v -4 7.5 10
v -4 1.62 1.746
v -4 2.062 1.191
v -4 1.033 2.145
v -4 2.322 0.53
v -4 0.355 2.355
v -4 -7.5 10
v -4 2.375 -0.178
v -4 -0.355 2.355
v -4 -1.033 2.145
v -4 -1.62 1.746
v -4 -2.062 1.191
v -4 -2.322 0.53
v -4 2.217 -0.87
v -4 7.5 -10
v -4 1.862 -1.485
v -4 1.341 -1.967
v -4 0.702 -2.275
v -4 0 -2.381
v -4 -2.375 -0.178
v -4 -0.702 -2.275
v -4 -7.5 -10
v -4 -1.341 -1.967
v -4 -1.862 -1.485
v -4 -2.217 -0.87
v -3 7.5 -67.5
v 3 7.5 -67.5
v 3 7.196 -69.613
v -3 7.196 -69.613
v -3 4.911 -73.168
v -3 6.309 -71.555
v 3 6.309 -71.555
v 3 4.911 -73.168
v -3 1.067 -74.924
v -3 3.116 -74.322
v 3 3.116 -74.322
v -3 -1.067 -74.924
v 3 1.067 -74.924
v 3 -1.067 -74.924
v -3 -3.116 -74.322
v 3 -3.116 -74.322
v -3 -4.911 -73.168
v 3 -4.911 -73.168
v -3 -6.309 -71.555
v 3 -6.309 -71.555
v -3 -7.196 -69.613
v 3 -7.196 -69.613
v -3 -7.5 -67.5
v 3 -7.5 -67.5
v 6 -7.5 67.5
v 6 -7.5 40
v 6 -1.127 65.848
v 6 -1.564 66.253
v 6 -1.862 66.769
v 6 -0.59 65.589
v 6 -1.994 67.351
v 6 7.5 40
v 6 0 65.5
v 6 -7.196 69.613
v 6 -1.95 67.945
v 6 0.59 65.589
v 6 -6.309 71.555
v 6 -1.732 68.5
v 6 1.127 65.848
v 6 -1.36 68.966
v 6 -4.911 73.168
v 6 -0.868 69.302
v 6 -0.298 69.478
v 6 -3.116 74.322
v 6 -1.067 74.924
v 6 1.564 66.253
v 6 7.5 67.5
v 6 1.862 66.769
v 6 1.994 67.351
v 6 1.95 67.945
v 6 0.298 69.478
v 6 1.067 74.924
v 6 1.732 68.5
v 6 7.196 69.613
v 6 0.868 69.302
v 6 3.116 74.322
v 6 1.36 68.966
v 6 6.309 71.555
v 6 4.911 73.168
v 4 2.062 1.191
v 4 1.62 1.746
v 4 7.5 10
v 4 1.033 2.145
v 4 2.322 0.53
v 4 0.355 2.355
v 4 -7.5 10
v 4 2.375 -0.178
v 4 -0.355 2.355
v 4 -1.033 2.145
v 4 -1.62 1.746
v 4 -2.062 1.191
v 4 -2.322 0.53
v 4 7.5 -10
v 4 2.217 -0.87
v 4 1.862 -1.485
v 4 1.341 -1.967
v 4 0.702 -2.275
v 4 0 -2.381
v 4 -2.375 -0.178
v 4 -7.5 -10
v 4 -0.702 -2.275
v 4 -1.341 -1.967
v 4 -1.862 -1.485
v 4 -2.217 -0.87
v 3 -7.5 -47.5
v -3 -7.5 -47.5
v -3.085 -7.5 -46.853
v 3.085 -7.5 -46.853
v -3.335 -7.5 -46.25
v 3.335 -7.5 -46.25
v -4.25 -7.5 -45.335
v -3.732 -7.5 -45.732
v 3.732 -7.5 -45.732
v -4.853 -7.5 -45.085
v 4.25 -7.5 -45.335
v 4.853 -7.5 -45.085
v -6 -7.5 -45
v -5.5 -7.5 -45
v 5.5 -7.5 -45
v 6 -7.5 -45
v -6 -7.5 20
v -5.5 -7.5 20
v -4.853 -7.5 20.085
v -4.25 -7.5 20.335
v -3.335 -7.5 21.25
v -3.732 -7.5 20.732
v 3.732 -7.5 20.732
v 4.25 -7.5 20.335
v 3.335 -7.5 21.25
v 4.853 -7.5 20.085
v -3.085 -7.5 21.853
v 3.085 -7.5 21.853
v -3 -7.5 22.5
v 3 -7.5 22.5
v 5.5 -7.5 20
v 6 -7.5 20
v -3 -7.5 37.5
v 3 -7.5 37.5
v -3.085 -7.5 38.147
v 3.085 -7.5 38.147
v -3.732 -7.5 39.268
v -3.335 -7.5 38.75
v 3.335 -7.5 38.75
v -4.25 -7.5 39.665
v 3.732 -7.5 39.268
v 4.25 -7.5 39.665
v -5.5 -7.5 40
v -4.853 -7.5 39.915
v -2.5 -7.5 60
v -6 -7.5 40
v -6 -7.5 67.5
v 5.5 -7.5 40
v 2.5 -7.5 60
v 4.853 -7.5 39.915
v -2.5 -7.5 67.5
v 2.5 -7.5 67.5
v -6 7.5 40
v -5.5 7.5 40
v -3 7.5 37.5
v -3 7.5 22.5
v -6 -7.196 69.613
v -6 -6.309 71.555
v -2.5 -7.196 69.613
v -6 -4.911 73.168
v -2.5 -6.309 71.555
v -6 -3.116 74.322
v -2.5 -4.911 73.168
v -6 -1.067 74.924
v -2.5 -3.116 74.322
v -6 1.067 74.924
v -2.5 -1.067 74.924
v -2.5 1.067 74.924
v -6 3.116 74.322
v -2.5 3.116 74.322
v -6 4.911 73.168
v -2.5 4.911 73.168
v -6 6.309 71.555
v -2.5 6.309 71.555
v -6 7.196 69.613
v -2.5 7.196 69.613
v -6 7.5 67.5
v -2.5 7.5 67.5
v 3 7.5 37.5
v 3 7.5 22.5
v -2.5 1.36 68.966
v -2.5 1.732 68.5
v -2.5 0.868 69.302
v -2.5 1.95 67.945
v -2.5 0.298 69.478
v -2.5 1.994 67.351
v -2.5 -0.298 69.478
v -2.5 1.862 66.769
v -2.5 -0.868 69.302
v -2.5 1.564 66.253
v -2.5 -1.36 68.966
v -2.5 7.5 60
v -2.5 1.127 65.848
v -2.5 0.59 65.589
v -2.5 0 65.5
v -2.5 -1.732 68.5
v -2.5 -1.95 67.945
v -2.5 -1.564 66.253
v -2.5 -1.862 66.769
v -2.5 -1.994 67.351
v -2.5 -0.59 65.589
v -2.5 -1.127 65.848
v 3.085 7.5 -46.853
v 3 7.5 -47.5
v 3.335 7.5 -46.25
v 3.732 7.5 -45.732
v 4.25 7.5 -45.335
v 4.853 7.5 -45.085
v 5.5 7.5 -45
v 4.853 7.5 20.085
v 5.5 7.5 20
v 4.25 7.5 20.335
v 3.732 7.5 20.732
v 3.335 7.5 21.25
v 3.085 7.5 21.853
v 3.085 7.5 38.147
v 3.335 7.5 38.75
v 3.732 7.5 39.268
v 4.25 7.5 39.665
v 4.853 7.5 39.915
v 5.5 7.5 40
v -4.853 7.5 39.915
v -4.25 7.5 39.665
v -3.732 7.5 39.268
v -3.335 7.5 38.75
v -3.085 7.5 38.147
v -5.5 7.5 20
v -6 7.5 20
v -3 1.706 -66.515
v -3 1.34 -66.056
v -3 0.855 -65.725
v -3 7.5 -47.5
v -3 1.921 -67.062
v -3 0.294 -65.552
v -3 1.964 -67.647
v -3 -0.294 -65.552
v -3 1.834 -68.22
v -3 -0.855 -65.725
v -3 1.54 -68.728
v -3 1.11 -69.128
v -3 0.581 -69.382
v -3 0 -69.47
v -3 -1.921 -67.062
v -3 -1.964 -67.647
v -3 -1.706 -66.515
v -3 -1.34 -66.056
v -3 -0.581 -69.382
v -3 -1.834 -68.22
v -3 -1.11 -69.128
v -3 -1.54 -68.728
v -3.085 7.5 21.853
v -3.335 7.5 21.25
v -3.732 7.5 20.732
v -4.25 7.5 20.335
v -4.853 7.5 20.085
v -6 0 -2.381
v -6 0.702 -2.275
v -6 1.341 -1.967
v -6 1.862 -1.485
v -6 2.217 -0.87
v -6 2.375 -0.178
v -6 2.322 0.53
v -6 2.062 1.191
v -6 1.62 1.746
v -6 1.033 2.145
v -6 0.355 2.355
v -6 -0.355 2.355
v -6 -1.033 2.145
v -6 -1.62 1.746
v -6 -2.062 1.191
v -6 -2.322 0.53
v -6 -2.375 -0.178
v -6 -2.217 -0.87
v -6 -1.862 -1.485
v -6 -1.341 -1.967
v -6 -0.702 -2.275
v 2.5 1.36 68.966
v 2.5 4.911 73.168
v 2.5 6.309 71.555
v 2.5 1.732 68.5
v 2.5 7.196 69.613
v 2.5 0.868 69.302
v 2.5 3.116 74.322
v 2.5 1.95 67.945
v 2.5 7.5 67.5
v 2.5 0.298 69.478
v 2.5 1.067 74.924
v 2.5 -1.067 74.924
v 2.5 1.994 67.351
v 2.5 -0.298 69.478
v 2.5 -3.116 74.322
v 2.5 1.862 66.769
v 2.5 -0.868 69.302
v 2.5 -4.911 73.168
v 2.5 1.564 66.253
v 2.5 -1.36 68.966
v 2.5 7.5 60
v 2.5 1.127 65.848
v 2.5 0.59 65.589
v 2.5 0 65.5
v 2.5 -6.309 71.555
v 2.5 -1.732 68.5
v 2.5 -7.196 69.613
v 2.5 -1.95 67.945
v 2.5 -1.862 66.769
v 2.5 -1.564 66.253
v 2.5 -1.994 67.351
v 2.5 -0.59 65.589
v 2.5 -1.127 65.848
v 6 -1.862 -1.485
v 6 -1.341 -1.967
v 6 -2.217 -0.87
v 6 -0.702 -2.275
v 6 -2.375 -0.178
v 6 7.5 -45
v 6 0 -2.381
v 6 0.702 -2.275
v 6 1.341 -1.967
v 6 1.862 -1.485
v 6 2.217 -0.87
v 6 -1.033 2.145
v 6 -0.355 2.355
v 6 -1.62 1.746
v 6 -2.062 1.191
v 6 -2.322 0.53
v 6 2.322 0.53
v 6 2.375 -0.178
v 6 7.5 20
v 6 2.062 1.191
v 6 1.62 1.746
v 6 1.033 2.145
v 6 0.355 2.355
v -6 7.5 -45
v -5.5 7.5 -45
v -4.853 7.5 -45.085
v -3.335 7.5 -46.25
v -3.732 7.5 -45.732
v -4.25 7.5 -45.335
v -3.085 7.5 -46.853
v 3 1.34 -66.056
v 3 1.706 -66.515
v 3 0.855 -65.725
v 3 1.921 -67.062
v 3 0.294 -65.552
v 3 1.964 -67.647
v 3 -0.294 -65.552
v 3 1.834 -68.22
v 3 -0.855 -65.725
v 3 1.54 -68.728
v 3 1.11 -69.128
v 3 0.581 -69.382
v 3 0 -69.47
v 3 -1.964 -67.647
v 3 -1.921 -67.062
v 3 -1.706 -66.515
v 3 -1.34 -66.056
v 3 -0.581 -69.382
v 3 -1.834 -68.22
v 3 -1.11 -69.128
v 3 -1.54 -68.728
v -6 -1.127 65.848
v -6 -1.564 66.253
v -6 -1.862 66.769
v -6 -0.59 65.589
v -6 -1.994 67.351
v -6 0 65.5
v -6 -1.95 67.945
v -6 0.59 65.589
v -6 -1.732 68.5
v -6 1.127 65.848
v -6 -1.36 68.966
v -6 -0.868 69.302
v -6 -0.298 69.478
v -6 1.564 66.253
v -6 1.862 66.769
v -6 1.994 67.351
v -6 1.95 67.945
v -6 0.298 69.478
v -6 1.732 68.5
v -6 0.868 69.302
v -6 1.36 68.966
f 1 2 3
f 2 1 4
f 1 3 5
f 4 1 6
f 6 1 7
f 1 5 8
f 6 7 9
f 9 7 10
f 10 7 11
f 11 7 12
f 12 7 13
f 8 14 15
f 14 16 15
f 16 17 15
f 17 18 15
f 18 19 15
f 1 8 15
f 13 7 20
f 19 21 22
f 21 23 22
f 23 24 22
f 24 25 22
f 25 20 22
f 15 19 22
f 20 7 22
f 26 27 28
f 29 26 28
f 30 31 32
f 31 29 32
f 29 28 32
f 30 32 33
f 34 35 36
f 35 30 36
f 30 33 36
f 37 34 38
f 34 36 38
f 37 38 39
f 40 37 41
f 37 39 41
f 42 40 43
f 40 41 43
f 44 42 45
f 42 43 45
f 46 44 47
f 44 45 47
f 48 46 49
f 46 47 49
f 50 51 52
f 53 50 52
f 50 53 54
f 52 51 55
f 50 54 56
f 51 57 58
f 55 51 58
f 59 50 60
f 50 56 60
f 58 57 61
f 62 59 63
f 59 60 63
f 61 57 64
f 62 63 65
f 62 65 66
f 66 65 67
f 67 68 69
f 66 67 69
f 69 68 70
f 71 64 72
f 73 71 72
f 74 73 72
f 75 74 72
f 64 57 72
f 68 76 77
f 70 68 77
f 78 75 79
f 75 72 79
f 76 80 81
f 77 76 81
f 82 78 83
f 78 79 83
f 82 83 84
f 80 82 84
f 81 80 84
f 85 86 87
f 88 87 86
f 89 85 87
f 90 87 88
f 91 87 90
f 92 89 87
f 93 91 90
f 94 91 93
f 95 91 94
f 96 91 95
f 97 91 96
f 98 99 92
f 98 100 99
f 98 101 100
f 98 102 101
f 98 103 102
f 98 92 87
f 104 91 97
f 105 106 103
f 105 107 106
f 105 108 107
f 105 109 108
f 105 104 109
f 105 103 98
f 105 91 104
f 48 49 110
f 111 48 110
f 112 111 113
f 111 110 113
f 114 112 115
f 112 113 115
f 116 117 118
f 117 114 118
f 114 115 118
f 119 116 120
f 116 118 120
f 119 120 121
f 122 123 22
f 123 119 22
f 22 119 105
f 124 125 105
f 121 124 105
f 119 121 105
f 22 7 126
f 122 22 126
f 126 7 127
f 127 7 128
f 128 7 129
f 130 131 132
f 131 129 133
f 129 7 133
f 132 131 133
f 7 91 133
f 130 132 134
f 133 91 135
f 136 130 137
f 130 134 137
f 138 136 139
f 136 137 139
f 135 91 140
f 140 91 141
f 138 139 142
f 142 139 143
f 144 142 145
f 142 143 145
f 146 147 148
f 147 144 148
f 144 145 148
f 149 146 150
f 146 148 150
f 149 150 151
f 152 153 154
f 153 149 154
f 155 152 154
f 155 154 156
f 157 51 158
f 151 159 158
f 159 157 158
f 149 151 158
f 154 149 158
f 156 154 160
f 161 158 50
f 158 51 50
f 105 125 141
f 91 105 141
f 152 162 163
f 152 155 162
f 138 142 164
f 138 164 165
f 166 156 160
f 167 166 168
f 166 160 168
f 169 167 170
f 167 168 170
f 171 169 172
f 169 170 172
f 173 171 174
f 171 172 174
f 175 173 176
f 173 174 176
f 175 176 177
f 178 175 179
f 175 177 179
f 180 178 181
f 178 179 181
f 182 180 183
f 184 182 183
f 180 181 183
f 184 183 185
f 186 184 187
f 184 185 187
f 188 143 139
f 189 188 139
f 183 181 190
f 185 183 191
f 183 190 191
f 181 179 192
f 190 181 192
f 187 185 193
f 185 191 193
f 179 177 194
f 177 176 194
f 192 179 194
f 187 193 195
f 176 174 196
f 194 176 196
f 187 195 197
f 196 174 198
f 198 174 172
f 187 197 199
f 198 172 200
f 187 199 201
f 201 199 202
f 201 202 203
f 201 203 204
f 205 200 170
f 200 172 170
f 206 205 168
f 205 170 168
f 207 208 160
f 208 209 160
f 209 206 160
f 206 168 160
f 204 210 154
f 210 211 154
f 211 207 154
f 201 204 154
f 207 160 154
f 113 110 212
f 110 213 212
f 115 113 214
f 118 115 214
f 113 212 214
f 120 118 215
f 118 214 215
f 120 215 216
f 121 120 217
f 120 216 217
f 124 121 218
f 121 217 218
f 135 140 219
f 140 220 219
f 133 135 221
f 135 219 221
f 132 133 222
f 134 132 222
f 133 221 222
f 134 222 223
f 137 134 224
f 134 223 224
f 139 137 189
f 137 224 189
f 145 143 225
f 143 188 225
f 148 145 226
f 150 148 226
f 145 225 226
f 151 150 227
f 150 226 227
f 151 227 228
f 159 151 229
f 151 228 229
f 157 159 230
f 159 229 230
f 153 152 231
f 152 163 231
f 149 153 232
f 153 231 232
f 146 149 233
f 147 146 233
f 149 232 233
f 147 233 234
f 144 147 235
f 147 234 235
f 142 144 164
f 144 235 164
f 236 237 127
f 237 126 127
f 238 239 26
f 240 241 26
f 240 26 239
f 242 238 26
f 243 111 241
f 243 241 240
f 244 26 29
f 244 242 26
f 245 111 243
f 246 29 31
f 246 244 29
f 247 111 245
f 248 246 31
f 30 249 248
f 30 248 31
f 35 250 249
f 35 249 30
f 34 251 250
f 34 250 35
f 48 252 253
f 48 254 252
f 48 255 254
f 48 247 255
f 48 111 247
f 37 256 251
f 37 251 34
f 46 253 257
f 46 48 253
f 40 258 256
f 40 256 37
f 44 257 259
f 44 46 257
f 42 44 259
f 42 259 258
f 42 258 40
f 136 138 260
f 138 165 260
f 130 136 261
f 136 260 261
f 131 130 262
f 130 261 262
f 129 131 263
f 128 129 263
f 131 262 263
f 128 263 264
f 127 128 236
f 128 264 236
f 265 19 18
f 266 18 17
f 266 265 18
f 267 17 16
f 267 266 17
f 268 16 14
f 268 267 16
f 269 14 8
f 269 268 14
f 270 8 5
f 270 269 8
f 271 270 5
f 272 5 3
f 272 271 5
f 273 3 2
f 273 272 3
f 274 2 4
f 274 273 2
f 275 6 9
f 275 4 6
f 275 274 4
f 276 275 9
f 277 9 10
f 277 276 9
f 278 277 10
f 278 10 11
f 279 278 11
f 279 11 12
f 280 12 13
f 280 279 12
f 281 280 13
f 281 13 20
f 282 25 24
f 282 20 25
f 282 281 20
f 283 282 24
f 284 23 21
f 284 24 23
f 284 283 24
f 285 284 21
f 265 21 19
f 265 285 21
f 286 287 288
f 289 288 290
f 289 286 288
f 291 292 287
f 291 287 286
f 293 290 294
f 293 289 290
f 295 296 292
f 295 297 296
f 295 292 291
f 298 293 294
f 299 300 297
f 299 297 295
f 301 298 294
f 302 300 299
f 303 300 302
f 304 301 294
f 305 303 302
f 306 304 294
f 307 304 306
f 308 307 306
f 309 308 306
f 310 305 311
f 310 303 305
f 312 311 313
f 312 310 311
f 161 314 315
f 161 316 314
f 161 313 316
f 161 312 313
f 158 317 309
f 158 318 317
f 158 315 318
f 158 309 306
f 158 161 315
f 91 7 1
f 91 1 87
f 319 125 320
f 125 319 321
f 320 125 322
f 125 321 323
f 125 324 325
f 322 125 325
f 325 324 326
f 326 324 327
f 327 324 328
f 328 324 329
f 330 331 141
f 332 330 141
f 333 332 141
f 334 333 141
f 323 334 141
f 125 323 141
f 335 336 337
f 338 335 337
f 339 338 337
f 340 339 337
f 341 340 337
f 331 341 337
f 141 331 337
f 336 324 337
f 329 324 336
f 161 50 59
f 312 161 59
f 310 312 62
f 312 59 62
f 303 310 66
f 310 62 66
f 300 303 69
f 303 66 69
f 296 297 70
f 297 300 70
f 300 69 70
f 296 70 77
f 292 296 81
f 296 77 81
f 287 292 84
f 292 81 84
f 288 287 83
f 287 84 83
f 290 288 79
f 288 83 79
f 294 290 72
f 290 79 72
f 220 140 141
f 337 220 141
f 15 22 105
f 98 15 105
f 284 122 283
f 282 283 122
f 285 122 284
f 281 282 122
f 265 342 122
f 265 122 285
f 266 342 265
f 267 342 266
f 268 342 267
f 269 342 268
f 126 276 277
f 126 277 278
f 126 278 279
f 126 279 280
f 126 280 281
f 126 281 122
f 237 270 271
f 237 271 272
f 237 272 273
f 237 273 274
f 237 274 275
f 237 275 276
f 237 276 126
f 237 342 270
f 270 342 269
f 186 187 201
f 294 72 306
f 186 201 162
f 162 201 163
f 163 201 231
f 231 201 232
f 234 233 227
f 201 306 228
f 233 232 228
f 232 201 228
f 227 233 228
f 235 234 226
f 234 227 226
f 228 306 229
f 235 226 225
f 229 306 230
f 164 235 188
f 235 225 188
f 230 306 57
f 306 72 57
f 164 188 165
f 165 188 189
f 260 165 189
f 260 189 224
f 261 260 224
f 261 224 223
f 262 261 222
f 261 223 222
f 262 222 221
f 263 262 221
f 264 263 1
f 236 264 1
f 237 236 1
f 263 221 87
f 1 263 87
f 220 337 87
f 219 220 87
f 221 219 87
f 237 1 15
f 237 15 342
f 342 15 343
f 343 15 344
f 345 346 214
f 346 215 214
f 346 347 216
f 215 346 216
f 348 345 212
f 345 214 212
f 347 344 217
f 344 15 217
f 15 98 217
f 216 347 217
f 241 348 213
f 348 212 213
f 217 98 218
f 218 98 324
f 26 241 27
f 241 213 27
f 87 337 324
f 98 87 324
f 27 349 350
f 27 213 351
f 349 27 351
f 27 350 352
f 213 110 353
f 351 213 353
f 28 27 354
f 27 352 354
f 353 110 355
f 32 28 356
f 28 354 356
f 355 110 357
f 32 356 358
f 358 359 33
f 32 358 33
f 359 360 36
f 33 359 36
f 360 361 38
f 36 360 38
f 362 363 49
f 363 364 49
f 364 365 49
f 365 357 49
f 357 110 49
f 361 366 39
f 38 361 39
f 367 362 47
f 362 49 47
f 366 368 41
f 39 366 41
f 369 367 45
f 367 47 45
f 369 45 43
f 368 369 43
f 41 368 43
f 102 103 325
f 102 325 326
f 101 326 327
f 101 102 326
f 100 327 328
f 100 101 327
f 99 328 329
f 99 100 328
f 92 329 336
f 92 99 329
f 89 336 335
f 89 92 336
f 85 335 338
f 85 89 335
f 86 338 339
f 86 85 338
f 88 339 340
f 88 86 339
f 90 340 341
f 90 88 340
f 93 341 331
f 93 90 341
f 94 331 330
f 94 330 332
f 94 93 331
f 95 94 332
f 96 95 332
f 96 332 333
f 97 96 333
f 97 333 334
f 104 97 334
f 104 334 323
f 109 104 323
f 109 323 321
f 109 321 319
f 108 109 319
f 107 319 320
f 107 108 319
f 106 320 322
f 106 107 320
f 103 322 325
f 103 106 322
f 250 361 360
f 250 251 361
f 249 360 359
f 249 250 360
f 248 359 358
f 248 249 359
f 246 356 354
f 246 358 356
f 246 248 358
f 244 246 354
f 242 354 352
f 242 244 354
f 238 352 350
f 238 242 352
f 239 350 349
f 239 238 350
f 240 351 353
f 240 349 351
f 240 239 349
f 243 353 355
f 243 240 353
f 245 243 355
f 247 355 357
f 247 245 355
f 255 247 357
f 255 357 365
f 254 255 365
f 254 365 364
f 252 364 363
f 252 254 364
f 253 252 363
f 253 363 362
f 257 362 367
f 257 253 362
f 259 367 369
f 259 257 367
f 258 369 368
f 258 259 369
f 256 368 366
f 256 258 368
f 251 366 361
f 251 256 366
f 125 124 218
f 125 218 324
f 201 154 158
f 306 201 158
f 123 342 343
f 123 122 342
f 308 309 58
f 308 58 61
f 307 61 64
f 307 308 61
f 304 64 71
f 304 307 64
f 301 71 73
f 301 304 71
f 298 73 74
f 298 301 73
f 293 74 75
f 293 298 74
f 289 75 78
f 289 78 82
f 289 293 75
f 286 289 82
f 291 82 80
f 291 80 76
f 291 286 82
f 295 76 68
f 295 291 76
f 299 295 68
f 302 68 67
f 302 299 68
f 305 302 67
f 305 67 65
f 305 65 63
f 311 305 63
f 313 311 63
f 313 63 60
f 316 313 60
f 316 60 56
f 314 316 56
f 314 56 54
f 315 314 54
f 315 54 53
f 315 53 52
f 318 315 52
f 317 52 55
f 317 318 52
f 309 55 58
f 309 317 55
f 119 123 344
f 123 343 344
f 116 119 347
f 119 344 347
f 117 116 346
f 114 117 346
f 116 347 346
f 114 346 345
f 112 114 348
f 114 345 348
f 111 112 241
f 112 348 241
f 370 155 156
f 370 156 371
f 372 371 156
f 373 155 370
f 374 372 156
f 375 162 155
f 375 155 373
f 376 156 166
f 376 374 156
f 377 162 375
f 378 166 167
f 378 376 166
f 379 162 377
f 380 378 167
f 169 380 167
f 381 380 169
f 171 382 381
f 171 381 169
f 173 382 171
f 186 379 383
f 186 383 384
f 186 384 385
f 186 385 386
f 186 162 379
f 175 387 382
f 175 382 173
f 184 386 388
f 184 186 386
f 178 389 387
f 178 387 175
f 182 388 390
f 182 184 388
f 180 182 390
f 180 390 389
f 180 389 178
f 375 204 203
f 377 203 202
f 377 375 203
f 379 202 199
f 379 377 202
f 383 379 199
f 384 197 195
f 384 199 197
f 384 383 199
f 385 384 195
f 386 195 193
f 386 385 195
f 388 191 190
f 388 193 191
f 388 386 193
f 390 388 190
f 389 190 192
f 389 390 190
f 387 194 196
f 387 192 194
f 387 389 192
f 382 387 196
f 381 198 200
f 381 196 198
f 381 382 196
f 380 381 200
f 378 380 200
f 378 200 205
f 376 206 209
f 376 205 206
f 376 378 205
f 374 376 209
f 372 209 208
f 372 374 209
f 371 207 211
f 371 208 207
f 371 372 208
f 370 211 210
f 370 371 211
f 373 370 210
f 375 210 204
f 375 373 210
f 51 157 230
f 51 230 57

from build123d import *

# Parameters (mm, degrees)
SKETCH1_R           = 2
SKETCH1_R_2         = 2.38125
SKETCH1_R_3         = 1.97
BASE_DEPTH          = 6
ALL_CUTS_DEPTH      = 76.612498967
ALL_CUTS_DEPTH_BACK = 76.612498967
SKETCH2_W           = 5
SKETCH2_H           = 30
SKETCH2_W_2         = 6
SKETCH2_H_2         = 20
SKETCH2_W_3         = 8
FILLET1_R           = 2.5


with BuildPart() as part:
    # Sketch1 → BASE (new, symmetric)
    with BuildSketch(Plane(origin=(0, 0, 0), x_dir=(0, 0, -1), z_dir=(1, 0, 0))):
        with BuildLine():
            Line((-67.5, 7.5), (67.5, 7.5))
            ThreePointArc((67.5, 7.5), (75, 0), (67.5, -7.5))
            Line((67.5, -7.5), (-67.5, -7.5))
            ThreePointArc((-67.5, -7.5), (-75, 0), (-67.5, 7.5))
        make_face()
        with Locations((-67.5, 0)):
            Circle(SKETCH1_R, mode=Mode.SUBTRACT)
        Circle(SKETCH1_R_2, mode=Mode.SUBTRACT)
        with Locations((67.5, 0)):
            Circle(SKETCH1_R_3, mode=Mode.SUBTRACT)
    extrude(amount=BASE_DEPTH, both=True)

    # Sketch2 → All_Cuts (cut, two sides: drawn at the far end of the back side and taken through both)
    with BuildSketch(Plane(origin=(0, 0, 0), x_dir=(1, 0, 0), z_dir=(0, 1, 0)).offset(-ALL_CUTS_DEPTH_BACK)):
        with Locations((0, -75)):
            Rectangle(SKETCH2_W, SKETCH2_H)
        with Locations((-6, -30)):
            Rectangle(SKETCH2_W_2, SKETCH2_H_2)
        with Locations((6, -30)):
            Rectangle(SKETCH2_W_2, SKETCH2_H_2)
        with Locations((6, 60)):
            Rectangle(SKETCH2_W_2, SKETCH2_H)
        with Locations((-6, 60)):
            Rectangle(SKETCH2_W_2, SKETCH2_H)
        Rectangle(SKETCH2_W_3, SKETCH2_H_2)
    extrude(amount=ALL_CUTS_DEPTH + ALL_CUTS_DEPTH_BACK, mode=Mode.SUBTRACT)

    # Fillet1
    fillet1_edges = [part.edges().sort_by_distance(p)[0] for p in [
        (3, 0, 20),
        (3, 0, 40),
        (-3, 0, 40),
        (-3, 0, 20),
        (3, 0, -45),
        (-3, 0, -45),
    ]]
    fillet(fillet1_edges, radius=FILLET1_R)


solid = part.part
